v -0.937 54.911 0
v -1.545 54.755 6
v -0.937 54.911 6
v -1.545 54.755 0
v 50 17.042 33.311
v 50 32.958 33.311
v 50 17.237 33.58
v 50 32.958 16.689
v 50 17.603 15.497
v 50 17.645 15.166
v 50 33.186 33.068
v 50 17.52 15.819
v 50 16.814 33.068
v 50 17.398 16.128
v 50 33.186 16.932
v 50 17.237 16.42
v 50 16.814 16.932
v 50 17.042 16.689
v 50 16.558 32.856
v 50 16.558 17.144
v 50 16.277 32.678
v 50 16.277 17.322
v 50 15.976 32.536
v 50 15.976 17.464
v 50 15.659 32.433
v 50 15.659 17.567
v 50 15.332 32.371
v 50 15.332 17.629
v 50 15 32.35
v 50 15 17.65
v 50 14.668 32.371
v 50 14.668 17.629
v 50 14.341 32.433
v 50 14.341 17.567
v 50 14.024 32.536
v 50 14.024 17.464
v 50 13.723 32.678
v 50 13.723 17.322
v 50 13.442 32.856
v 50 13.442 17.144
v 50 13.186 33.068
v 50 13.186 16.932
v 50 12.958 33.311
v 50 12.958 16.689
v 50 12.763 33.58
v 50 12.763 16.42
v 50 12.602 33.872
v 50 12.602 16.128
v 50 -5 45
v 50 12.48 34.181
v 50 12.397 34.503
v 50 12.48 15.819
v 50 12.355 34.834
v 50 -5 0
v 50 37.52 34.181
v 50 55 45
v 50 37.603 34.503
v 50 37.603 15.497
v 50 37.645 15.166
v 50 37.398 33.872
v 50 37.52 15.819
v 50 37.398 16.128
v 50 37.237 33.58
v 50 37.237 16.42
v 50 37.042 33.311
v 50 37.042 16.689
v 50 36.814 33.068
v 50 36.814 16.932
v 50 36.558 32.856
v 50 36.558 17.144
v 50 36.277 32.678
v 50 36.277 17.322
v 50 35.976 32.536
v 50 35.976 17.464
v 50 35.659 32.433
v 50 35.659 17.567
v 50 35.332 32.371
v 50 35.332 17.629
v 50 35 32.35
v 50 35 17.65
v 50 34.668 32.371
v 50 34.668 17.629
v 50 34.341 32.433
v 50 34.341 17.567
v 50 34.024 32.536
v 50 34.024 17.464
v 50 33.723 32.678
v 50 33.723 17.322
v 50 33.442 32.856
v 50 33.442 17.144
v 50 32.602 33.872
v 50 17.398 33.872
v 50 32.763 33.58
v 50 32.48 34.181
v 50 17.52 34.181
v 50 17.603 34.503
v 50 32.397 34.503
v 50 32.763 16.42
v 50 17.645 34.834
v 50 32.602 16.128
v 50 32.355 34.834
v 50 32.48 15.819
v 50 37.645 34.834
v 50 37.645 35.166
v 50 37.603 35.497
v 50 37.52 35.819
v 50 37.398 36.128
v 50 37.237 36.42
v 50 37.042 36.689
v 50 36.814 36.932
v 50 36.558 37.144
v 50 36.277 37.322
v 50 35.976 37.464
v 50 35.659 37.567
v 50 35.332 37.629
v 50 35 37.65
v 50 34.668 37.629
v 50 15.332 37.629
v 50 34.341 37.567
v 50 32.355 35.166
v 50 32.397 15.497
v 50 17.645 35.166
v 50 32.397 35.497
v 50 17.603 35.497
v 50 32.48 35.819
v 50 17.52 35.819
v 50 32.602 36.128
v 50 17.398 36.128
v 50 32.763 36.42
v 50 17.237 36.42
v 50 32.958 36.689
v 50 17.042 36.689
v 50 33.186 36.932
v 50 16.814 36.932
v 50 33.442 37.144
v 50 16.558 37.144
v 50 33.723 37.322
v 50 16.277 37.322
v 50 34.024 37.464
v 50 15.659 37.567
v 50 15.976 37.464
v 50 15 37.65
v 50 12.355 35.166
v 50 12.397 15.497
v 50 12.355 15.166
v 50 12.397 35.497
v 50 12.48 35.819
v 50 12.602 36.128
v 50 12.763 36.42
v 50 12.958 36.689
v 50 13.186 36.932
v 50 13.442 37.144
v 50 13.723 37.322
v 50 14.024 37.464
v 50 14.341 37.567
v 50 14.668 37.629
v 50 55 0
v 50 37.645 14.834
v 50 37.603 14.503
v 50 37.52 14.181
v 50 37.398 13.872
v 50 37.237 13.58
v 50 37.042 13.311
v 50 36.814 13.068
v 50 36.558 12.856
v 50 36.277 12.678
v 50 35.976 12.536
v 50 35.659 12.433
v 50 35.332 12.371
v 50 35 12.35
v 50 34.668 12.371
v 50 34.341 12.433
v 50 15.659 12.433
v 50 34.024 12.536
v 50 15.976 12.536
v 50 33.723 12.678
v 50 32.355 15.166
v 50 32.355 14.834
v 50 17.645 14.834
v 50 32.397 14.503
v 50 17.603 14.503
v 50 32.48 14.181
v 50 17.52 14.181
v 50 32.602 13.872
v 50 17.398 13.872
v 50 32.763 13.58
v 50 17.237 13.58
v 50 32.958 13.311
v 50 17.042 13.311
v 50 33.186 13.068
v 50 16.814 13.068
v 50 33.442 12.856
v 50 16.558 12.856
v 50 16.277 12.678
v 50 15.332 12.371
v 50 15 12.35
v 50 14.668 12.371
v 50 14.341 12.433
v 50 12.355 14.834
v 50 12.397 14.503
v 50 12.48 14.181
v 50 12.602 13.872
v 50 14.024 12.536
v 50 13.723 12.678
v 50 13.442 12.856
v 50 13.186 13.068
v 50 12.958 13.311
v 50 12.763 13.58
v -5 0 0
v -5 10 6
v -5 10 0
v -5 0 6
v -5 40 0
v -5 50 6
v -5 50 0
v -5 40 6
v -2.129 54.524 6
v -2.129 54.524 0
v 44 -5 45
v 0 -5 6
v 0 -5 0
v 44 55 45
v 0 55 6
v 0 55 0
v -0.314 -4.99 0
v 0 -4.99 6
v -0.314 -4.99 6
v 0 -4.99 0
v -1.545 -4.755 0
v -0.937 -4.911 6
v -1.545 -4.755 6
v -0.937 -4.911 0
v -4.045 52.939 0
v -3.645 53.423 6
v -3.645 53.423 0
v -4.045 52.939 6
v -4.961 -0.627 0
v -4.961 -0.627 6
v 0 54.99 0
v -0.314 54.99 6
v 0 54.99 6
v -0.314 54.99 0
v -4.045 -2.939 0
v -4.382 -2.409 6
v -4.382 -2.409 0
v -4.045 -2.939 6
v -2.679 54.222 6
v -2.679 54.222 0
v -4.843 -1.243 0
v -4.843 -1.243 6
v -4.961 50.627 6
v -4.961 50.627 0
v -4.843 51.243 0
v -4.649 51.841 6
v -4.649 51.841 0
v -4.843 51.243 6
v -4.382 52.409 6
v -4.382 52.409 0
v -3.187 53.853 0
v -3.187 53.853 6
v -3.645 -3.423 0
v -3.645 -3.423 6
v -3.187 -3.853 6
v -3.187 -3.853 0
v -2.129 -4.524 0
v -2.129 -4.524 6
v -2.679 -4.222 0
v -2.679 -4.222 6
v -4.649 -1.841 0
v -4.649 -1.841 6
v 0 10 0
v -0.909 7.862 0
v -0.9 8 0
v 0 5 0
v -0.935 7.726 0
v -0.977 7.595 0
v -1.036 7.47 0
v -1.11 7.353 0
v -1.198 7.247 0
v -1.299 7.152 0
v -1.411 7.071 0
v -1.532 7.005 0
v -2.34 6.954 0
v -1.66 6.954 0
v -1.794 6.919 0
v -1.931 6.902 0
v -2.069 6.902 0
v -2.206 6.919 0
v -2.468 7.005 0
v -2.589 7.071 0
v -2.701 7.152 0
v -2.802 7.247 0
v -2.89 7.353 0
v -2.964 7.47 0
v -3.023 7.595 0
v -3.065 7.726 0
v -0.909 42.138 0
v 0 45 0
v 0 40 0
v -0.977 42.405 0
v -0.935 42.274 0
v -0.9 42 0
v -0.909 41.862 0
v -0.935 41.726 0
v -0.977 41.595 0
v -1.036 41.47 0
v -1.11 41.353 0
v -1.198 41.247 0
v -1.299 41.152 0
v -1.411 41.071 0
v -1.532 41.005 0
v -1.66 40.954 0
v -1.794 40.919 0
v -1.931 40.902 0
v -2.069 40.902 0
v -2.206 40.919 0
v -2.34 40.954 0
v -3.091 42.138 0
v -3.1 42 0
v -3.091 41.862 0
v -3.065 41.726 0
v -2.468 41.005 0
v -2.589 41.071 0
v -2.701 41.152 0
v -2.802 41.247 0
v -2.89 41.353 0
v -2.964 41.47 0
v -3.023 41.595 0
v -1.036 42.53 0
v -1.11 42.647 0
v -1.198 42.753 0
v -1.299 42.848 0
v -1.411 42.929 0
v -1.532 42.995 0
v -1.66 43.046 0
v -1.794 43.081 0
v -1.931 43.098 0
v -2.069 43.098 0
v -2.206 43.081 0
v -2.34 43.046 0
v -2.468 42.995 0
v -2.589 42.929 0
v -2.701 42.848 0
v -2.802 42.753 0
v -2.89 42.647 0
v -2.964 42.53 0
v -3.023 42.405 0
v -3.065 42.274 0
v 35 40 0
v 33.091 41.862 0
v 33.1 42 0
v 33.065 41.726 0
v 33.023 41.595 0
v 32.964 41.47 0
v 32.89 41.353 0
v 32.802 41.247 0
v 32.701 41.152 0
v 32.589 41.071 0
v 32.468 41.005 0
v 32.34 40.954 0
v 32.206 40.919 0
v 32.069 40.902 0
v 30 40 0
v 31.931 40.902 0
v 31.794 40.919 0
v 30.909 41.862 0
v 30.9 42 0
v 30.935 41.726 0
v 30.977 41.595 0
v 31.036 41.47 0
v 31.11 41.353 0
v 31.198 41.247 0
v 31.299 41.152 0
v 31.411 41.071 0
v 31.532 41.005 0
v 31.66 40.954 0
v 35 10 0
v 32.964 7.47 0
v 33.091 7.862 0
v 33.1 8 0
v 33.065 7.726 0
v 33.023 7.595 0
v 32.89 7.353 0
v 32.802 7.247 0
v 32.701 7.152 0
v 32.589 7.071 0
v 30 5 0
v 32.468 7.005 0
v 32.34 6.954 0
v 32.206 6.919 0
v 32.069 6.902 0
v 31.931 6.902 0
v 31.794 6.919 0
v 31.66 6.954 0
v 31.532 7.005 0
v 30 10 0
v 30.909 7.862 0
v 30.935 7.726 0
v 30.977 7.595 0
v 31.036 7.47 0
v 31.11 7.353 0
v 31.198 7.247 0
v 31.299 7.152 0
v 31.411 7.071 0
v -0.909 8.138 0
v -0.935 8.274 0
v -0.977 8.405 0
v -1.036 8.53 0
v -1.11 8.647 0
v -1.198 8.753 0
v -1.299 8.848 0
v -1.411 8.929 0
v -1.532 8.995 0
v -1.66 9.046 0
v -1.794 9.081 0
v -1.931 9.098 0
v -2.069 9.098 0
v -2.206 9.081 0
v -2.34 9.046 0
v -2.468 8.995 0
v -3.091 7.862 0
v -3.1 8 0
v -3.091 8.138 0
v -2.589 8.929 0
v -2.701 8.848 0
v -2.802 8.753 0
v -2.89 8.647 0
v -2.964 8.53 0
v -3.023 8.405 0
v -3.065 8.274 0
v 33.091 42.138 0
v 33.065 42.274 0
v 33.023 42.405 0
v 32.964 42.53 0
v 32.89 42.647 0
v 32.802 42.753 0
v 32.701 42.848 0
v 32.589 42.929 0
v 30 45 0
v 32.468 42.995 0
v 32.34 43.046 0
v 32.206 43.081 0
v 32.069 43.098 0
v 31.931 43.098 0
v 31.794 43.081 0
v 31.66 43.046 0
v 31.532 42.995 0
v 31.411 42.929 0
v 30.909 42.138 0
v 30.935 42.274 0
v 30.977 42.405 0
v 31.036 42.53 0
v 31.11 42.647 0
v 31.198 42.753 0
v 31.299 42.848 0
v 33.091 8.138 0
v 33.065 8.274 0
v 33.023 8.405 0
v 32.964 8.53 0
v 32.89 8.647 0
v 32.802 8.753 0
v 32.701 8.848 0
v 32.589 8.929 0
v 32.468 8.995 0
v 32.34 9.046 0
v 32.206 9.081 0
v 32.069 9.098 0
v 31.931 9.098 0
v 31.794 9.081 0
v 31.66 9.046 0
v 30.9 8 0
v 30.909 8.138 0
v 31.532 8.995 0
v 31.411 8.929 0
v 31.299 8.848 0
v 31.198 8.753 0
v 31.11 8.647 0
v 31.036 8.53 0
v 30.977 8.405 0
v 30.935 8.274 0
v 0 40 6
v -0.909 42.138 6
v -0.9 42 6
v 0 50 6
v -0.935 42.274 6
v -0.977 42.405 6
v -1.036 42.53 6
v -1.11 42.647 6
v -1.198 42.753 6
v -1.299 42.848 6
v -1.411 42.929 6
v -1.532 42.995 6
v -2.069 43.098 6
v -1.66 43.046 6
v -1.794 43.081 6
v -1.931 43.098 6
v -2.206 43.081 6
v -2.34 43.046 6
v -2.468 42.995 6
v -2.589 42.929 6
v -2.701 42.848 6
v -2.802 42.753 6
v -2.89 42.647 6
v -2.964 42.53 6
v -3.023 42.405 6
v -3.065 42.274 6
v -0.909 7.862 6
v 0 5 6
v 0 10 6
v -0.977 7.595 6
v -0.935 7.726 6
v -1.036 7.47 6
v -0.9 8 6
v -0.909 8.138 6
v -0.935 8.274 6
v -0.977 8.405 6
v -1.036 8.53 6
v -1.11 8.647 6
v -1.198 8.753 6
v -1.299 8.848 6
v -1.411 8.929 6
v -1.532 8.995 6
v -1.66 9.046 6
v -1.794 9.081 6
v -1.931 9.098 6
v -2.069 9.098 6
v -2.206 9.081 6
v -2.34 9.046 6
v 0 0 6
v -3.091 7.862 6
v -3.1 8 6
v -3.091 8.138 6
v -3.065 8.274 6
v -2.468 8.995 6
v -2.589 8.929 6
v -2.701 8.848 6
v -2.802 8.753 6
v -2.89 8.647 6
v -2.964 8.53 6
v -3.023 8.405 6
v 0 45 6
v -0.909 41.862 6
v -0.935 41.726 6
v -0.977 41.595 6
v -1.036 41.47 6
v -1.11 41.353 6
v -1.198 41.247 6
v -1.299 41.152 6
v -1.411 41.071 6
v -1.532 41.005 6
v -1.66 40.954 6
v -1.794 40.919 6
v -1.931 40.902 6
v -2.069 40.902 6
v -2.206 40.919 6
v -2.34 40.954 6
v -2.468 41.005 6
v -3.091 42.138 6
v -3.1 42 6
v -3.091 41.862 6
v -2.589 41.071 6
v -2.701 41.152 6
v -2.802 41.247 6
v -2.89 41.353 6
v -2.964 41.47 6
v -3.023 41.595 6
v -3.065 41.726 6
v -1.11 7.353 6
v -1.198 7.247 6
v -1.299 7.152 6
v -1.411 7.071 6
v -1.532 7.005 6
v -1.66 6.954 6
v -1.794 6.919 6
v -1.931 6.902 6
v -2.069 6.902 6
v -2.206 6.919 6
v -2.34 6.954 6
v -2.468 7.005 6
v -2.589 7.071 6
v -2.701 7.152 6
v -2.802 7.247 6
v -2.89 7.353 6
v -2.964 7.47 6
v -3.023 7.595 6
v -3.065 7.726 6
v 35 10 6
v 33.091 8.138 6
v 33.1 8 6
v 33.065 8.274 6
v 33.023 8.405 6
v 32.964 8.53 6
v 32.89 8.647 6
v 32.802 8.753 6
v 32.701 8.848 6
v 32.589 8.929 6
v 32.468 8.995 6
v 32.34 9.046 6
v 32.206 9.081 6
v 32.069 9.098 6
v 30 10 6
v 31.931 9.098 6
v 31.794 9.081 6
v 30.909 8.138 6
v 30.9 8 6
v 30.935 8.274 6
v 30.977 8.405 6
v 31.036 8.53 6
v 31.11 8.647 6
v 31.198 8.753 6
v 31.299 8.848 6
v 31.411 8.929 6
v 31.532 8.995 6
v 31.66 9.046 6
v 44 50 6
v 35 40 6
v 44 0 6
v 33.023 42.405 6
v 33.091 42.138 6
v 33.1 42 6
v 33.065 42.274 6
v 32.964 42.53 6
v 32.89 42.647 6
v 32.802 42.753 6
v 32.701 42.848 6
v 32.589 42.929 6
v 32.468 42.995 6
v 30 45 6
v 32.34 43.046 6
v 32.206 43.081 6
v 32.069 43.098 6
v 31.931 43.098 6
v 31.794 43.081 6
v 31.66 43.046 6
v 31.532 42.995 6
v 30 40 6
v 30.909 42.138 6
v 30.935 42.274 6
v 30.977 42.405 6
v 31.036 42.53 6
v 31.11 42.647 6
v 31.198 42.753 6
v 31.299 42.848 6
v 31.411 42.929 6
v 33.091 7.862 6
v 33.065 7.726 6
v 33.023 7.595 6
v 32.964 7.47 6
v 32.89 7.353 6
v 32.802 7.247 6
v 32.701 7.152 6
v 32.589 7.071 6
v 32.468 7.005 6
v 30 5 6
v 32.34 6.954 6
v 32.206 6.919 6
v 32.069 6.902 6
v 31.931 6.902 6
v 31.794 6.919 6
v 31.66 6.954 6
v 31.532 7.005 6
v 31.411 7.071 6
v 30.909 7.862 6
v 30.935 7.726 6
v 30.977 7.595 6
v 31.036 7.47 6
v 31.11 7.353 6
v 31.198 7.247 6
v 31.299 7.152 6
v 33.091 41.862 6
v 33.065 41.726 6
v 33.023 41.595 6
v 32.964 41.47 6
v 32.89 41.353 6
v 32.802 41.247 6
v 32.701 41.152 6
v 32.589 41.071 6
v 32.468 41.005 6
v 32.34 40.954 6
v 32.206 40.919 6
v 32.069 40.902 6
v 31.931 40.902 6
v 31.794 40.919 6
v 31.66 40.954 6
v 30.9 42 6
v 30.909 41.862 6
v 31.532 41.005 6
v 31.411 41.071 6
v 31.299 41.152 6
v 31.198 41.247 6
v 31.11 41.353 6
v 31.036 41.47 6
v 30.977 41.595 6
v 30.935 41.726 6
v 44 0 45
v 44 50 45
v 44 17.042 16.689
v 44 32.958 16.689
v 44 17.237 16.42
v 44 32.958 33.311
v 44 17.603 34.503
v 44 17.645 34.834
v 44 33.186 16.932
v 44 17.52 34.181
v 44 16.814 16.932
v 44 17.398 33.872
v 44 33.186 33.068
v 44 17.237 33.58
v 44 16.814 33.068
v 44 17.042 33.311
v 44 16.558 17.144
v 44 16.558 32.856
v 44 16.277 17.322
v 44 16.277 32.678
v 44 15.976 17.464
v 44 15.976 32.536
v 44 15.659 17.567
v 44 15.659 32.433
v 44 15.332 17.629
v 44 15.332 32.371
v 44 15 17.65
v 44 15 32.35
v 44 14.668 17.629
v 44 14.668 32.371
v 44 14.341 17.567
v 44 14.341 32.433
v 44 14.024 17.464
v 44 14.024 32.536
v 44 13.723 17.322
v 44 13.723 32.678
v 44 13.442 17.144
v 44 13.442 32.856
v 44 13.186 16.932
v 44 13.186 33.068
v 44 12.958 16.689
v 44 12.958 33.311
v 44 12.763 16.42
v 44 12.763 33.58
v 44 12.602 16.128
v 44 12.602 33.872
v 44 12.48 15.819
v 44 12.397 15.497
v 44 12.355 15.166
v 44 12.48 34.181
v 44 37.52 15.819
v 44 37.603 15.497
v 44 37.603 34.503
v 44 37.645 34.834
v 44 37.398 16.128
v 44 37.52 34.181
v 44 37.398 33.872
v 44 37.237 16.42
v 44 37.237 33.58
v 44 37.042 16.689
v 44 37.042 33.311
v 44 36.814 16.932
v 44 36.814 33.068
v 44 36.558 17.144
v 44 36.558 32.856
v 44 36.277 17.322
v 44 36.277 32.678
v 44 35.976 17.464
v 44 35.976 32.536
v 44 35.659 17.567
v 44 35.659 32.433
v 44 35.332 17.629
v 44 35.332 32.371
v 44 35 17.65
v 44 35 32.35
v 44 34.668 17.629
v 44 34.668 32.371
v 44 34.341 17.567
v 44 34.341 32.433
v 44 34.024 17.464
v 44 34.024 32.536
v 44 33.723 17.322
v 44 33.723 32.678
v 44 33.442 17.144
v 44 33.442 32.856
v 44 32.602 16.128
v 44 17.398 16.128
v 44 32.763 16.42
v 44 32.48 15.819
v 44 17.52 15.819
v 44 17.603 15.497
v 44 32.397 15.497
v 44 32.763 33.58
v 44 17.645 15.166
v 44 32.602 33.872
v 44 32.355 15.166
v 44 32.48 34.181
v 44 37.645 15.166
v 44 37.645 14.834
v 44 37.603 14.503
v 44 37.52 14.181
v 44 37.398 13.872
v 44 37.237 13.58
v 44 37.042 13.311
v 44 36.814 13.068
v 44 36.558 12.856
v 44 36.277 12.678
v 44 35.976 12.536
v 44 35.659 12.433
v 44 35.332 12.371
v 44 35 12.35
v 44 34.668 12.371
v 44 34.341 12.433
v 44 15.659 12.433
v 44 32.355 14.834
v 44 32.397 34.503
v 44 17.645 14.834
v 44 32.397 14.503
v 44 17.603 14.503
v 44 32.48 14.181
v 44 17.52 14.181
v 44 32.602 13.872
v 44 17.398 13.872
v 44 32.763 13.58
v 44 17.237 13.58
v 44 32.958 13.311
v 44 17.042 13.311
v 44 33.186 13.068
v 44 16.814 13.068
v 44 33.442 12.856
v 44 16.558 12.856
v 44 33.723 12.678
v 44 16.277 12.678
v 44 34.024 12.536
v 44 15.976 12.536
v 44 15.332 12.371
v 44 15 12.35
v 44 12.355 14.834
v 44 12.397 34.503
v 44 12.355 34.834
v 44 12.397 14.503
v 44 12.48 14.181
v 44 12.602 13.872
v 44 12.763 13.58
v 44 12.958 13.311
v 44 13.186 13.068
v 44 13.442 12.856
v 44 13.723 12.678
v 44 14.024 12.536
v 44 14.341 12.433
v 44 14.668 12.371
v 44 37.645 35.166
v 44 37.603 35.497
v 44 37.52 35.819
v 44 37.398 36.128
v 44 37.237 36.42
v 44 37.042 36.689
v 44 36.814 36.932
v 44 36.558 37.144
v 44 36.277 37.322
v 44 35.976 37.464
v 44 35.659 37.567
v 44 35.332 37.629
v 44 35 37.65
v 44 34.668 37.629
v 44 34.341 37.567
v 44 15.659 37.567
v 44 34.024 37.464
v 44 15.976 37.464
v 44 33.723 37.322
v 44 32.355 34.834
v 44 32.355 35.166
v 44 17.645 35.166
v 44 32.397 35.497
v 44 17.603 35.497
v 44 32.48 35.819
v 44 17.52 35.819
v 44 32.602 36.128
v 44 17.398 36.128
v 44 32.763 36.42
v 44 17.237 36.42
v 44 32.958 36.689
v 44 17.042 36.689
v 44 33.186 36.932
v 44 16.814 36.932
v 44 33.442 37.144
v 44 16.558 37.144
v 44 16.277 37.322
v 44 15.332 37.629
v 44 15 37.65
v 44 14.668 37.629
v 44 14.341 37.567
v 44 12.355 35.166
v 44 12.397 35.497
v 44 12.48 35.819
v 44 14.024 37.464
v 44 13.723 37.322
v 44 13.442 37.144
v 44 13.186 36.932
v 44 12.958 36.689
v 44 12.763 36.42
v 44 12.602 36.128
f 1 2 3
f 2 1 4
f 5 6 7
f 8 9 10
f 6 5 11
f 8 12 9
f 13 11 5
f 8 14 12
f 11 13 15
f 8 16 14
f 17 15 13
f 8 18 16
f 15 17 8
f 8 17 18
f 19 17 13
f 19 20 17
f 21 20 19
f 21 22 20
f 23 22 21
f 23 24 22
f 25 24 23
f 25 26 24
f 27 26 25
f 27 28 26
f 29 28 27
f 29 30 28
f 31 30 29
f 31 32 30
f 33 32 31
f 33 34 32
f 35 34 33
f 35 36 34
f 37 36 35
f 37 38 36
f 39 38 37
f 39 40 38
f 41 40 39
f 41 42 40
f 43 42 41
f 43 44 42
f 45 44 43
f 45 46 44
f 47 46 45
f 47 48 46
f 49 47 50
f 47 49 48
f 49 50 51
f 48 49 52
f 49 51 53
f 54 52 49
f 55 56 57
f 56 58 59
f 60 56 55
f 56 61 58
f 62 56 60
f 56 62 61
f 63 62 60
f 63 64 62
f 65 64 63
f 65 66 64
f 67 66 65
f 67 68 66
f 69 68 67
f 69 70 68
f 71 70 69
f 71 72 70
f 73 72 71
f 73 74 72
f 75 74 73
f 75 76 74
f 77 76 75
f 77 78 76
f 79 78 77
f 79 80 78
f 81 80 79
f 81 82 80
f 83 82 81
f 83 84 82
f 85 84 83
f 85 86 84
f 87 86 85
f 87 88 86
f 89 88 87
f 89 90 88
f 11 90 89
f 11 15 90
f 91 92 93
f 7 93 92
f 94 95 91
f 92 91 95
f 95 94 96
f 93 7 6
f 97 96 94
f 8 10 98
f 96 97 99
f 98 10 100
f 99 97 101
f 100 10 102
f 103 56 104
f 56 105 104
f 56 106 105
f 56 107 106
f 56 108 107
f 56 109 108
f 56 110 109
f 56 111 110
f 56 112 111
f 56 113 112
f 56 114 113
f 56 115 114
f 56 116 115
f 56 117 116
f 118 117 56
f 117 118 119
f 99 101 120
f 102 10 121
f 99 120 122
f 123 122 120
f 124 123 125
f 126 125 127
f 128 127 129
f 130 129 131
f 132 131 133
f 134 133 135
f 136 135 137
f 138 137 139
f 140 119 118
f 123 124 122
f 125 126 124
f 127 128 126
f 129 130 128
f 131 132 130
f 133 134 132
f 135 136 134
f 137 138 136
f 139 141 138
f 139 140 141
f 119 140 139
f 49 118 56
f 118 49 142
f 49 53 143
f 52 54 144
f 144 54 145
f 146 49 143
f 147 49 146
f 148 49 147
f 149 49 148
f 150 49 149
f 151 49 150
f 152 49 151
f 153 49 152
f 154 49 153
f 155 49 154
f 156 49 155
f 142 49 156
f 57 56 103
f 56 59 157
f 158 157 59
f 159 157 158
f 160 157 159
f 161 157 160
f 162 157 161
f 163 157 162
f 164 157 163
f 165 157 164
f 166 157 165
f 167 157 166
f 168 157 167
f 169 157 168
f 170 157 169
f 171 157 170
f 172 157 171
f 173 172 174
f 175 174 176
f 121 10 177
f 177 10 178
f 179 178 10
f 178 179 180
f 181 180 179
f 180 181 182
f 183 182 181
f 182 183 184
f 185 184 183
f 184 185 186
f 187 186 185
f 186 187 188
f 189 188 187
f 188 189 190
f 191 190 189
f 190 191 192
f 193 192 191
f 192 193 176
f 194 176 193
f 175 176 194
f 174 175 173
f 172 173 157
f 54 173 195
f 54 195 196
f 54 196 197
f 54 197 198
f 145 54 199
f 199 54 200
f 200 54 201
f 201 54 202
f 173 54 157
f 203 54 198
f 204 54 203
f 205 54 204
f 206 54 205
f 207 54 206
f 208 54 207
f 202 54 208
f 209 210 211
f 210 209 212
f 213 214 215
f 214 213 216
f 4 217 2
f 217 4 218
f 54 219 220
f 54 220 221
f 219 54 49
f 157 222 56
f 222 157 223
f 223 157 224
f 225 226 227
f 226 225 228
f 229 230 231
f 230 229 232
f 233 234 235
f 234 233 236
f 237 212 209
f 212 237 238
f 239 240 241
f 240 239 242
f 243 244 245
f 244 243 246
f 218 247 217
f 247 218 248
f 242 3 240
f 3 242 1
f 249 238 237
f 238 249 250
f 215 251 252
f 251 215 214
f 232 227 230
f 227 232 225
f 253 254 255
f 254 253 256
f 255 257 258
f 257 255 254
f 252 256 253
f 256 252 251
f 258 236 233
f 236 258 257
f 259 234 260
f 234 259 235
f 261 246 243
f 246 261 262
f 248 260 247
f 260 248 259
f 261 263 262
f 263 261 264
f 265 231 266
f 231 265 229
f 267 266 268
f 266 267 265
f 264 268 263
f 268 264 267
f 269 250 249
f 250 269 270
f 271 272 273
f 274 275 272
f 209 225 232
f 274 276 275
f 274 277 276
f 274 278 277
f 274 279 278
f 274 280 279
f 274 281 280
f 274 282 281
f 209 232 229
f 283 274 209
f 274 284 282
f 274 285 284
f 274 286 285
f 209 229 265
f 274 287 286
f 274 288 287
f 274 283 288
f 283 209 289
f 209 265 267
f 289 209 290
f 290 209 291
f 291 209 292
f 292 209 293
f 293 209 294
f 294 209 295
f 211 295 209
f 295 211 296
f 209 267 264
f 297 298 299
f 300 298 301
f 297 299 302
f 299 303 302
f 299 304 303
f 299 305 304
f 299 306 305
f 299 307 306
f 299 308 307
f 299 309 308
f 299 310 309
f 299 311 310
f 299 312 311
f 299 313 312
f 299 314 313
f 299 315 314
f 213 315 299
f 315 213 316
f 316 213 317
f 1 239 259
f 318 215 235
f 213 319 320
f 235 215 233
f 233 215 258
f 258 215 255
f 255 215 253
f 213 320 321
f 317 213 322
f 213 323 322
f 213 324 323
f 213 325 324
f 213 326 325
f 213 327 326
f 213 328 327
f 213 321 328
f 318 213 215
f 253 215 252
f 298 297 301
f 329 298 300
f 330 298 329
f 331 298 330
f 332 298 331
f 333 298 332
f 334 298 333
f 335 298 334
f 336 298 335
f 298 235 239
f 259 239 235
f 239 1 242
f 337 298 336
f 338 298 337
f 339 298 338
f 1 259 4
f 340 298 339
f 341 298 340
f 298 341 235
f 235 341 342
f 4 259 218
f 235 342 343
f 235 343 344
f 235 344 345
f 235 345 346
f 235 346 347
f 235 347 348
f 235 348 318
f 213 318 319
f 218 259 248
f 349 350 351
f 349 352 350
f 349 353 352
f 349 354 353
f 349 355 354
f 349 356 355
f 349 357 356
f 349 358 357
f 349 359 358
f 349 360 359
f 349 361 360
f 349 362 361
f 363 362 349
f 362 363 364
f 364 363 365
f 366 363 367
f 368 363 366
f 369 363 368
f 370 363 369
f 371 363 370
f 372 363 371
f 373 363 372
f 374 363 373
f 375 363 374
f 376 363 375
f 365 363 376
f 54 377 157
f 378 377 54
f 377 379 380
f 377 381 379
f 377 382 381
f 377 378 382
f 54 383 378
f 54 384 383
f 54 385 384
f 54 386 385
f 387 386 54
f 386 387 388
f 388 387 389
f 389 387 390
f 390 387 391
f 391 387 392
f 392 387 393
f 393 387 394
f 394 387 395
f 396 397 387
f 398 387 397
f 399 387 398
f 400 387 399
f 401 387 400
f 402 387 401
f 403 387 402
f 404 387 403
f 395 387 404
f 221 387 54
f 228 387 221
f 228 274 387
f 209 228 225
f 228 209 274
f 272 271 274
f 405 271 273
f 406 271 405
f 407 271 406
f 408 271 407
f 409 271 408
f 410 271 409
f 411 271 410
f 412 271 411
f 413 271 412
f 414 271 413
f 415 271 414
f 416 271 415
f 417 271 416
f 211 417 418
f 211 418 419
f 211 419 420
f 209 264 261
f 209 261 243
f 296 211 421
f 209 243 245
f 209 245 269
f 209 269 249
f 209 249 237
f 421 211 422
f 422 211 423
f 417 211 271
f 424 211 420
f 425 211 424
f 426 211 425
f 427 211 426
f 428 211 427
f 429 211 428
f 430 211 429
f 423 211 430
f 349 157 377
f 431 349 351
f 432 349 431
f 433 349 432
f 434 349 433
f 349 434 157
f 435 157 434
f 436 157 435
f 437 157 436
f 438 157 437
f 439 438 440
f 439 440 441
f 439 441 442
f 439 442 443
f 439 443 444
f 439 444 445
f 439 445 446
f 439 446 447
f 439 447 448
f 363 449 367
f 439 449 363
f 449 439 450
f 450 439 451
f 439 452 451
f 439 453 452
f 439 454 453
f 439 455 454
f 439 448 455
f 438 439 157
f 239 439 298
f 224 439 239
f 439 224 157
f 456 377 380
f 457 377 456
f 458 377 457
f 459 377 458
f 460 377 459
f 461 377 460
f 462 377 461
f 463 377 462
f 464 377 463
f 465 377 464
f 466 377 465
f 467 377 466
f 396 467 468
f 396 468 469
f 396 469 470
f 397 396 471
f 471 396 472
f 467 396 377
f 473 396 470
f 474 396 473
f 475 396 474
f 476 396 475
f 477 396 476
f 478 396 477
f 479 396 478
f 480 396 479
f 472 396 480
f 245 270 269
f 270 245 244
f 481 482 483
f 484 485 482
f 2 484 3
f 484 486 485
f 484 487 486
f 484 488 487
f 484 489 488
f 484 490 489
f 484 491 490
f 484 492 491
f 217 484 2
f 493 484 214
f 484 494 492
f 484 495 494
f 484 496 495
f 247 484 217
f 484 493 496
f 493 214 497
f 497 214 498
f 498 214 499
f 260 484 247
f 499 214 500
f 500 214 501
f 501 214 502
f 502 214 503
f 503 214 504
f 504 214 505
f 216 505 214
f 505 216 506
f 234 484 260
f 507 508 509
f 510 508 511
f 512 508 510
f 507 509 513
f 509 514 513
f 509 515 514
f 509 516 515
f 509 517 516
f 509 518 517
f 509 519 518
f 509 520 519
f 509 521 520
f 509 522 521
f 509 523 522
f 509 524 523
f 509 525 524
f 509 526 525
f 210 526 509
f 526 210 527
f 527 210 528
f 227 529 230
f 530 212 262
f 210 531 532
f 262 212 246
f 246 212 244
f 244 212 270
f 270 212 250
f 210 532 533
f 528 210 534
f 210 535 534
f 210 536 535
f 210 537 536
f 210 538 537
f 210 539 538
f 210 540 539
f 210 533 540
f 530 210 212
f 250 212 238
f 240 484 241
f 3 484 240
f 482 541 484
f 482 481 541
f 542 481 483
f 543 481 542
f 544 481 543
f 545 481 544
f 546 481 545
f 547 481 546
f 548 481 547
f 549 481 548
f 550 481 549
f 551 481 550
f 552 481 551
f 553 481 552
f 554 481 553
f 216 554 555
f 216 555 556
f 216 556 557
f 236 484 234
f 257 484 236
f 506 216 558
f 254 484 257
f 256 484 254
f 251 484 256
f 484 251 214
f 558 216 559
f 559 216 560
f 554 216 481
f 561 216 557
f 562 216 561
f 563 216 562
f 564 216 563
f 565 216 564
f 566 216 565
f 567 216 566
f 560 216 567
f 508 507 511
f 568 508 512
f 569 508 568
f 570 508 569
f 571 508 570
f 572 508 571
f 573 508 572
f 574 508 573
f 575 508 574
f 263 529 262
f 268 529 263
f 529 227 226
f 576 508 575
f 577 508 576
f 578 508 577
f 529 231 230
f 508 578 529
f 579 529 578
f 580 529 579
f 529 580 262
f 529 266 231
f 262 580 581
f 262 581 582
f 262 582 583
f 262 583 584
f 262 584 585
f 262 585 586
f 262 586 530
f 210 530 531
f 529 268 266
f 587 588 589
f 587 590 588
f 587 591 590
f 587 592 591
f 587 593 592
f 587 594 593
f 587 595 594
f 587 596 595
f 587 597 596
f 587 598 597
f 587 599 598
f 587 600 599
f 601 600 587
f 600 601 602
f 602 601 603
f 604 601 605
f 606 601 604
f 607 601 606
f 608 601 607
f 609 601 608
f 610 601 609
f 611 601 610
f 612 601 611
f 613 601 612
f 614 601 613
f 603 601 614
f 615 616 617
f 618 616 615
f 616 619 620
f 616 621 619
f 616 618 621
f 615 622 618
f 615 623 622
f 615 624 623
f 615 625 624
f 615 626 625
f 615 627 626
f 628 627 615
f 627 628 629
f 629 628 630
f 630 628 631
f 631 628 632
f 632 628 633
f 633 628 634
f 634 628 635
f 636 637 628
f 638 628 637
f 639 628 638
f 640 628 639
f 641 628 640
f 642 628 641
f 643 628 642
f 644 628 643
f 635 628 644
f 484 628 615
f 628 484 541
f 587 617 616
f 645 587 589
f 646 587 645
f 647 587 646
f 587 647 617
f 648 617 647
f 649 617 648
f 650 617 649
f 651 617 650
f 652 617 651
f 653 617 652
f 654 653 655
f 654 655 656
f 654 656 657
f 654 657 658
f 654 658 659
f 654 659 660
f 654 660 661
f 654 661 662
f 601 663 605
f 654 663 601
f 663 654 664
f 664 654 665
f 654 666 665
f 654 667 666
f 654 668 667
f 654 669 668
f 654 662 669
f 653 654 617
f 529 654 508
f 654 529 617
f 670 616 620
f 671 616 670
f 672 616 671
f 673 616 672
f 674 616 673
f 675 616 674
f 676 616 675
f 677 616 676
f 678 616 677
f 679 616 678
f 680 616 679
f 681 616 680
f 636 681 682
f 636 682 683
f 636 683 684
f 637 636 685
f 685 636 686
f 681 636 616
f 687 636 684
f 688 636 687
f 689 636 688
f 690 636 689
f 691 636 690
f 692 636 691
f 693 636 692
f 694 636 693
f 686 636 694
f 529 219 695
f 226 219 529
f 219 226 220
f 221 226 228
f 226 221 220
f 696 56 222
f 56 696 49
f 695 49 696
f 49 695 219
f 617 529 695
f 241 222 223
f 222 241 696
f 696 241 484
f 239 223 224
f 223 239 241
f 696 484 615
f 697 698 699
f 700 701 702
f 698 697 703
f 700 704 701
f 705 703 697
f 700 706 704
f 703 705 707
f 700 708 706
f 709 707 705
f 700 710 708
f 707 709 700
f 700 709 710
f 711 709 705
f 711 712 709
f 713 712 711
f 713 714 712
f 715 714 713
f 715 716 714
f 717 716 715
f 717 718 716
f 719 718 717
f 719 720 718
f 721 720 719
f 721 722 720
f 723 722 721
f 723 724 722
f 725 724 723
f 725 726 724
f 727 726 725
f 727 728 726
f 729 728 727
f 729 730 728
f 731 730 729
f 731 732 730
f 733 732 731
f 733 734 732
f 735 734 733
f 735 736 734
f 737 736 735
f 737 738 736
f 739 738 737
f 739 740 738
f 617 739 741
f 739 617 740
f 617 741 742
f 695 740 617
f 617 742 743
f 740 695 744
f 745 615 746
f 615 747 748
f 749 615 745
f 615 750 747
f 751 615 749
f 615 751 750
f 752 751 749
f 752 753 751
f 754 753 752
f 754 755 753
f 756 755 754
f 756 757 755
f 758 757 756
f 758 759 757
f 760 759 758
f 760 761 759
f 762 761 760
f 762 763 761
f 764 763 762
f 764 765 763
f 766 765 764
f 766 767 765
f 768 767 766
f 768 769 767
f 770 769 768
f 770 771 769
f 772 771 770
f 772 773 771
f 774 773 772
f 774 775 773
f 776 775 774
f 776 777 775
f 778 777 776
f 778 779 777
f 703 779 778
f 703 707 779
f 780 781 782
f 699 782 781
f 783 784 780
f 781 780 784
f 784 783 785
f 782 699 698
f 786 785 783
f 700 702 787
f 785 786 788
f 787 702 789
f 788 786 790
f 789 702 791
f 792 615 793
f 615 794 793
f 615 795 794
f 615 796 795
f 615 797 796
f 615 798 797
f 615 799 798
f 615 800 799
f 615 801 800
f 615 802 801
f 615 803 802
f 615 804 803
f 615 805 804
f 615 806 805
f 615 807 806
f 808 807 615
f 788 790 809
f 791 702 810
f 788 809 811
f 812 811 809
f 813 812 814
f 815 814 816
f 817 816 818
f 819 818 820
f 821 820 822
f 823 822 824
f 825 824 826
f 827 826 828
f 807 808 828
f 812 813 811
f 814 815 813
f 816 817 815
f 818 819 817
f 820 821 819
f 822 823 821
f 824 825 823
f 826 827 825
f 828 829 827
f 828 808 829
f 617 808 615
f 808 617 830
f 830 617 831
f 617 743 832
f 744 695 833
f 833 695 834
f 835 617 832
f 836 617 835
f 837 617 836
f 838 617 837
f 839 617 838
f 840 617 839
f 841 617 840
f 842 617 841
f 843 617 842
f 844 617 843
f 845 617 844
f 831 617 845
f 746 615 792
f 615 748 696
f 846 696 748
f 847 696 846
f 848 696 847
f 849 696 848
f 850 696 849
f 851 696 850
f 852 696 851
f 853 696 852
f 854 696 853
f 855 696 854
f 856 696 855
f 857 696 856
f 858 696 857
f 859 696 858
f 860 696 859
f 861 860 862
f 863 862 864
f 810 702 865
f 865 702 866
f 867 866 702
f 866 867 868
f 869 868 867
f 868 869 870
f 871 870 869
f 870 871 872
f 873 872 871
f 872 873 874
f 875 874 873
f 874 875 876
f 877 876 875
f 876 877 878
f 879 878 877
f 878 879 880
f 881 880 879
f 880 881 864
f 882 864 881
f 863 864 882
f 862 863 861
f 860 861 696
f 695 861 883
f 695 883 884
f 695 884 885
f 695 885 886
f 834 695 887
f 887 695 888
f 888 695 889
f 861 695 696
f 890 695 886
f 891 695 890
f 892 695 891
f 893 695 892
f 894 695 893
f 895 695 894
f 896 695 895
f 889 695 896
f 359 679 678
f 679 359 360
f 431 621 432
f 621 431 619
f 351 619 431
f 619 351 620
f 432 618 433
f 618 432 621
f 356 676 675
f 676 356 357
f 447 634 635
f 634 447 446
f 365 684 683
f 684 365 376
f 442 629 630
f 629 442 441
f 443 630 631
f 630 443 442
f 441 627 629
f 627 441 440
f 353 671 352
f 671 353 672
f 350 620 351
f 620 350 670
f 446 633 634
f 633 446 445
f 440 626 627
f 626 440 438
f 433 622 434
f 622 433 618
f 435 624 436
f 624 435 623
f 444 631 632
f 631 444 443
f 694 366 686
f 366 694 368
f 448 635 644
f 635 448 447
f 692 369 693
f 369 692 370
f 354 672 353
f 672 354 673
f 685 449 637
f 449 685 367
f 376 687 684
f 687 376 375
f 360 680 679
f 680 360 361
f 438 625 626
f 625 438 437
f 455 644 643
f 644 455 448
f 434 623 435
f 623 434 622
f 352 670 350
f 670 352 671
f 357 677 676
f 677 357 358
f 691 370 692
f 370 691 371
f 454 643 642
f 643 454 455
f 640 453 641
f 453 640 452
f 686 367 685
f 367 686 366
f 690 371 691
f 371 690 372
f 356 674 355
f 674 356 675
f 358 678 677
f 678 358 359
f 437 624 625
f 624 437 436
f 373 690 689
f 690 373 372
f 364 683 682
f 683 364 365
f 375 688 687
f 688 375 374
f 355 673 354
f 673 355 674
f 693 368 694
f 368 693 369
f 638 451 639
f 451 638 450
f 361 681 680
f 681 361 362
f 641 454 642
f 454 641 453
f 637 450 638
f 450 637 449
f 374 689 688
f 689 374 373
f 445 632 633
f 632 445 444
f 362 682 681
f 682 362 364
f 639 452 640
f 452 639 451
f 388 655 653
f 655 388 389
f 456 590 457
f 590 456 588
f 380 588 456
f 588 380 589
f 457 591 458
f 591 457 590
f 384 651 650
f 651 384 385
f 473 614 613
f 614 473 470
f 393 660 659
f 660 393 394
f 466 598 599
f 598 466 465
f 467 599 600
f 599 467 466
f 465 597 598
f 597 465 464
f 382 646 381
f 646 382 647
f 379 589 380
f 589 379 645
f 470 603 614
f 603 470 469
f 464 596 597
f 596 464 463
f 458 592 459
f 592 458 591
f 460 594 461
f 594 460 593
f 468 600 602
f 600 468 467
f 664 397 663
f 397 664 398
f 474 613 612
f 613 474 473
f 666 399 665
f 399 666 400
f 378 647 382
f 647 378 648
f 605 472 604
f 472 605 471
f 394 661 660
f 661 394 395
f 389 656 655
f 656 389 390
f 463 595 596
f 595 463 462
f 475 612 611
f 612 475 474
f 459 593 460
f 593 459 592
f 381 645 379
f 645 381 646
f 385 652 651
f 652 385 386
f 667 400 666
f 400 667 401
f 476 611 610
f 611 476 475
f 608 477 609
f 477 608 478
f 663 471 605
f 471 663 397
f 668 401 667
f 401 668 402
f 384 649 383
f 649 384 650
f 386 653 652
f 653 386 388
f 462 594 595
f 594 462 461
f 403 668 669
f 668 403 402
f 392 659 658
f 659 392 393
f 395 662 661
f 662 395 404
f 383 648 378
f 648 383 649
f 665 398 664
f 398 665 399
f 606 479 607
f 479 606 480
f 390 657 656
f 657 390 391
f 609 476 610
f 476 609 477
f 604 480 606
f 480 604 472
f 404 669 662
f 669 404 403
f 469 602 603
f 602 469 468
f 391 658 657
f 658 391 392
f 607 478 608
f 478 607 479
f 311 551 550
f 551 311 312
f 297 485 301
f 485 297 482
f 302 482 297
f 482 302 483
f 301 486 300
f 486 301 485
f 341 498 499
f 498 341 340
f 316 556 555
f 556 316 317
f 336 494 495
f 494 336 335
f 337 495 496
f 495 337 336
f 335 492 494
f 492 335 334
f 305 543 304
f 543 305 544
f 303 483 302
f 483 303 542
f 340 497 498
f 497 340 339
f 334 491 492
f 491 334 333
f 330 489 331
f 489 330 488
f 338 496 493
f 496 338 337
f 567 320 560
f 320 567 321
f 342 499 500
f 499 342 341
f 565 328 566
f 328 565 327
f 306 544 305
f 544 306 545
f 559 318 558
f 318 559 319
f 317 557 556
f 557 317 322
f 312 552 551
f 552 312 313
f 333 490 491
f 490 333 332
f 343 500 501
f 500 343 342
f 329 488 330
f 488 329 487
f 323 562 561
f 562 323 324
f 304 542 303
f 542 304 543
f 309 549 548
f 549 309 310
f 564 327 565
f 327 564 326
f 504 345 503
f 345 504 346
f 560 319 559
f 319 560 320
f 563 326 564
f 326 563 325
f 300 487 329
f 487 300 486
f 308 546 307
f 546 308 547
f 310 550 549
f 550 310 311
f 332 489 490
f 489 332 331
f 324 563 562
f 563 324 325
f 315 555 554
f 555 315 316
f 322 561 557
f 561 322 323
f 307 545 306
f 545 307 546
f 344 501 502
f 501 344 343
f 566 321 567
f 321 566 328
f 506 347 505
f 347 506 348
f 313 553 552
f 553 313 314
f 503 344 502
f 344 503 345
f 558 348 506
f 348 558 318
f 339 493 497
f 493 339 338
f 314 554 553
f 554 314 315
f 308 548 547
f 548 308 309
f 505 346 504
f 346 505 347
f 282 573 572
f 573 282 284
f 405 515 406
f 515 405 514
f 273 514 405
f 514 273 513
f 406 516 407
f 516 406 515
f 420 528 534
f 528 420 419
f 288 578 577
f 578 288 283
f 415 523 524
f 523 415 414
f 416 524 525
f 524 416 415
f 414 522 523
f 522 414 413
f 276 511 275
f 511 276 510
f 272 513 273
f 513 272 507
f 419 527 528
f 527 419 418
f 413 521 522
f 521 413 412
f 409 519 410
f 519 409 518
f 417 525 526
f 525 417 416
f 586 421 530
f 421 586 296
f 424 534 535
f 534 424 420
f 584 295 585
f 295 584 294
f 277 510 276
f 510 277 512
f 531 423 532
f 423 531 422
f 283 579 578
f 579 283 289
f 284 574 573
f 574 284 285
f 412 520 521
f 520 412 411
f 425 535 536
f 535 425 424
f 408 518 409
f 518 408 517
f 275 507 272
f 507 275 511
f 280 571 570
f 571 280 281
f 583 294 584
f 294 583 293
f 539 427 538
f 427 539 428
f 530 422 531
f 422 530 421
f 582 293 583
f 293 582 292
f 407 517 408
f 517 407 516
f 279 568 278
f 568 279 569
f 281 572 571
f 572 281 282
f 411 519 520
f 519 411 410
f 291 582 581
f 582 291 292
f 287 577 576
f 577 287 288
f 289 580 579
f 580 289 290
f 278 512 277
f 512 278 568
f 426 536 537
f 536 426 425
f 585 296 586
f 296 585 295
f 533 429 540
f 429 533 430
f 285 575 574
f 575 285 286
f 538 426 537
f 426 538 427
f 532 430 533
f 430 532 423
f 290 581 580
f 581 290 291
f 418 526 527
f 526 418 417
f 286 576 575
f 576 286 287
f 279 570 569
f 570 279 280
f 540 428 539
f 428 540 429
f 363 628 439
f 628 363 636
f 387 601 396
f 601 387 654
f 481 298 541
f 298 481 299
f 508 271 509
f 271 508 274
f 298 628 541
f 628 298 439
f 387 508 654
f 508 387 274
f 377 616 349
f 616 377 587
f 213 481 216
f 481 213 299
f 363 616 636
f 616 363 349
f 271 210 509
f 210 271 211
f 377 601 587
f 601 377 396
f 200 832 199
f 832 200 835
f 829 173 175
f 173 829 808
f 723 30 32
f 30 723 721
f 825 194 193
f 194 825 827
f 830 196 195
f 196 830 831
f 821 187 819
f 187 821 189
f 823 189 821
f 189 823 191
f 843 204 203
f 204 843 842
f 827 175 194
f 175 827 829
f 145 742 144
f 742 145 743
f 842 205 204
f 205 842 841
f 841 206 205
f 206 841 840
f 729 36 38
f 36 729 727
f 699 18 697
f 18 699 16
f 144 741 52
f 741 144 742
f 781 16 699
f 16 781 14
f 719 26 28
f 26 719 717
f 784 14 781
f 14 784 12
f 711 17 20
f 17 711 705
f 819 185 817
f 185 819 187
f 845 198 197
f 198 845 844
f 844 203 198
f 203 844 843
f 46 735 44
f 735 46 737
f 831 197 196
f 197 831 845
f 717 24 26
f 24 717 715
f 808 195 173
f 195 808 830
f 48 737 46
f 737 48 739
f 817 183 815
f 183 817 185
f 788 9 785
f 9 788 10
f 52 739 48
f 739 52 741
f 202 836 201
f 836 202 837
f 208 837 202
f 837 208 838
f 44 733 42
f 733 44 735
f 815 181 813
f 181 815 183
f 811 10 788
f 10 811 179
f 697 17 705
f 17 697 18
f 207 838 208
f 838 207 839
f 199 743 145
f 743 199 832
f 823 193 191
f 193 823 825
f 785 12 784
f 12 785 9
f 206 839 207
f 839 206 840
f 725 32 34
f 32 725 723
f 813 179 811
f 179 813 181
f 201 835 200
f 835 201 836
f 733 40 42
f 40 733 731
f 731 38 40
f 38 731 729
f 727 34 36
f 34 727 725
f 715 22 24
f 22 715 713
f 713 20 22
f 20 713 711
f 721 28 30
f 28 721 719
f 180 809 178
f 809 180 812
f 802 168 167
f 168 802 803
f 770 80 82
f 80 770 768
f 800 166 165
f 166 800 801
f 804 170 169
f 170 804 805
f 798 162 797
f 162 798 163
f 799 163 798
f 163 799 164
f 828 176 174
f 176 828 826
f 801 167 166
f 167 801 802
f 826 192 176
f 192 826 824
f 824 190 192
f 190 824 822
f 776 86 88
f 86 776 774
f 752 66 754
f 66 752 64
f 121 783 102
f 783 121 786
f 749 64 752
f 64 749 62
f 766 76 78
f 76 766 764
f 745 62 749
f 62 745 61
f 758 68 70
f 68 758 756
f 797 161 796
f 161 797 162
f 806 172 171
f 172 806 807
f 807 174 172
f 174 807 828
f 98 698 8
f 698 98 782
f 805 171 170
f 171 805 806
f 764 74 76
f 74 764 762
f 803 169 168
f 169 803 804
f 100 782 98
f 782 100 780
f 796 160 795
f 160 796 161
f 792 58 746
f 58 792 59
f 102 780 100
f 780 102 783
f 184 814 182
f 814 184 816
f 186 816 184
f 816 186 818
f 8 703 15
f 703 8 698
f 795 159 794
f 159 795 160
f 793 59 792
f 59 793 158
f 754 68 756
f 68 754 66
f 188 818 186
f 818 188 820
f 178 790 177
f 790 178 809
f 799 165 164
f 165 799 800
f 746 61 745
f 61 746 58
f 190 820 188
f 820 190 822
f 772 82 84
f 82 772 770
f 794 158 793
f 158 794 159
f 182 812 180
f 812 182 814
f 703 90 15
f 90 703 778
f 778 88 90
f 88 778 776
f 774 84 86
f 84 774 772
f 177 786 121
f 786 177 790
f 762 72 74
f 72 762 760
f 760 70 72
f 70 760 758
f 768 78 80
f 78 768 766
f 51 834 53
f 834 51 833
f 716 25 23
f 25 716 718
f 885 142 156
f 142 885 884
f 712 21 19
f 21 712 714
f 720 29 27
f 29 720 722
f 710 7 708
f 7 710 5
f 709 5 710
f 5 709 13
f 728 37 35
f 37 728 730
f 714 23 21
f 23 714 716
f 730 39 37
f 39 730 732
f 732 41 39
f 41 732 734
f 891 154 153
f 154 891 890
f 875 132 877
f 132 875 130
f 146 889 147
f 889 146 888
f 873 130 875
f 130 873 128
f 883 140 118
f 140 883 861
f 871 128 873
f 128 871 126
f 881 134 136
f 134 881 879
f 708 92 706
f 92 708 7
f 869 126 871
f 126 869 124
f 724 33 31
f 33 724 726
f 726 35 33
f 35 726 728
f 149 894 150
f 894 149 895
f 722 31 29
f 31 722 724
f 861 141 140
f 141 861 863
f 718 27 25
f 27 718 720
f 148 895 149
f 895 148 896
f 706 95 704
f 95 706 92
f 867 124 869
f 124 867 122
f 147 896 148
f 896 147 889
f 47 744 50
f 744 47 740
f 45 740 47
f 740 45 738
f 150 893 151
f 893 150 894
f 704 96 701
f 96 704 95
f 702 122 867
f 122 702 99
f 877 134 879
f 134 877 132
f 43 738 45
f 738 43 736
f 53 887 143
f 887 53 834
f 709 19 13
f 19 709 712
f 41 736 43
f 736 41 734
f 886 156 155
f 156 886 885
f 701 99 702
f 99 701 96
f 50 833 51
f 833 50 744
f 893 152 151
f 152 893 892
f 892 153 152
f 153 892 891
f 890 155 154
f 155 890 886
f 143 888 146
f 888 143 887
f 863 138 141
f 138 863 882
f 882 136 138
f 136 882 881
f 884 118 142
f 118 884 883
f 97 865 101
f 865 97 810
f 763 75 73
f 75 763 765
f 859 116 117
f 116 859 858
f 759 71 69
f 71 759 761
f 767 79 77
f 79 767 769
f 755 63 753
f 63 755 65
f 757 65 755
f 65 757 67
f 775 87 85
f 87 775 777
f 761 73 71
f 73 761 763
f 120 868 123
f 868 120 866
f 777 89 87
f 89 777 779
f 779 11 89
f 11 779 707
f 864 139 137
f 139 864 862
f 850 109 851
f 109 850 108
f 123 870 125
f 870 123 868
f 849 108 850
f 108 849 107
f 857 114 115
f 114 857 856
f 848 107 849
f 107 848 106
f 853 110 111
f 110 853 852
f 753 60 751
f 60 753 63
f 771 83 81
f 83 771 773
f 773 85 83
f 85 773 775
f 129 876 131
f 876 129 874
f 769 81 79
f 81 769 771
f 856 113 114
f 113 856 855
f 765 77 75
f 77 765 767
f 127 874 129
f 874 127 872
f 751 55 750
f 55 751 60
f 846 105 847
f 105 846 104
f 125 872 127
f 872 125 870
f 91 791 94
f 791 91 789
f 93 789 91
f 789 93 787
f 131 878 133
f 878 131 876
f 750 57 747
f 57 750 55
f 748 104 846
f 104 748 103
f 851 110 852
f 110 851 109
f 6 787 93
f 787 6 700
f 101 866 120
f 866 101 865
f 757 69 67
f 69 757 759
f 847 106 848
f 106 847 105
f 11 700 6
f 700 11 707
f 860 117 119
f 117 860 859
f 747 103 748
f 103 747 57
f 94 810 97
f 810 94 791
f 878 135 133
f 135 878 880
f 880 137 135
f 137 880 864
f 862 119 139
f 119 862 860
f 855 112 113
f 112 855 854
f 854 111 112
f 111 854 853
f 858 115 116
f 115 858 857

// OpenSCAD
$fn=50;
$cameraholes=34;
$thickness=6;
$width=50;
$depth=45;
$drill5=5.3;
$drill2=2.2;

difference() {
    union() {
        hull() {
            translate([0,0,0]) cylinder(r=5,h=$thickness);
            translate([0,$width,0]) cylinder(r=5,h=$thickness);
            translate([$depth,-5,0]) cube([5,5,$thickness]);
            translate([$depth,$width,0]) cube([5,5,$thickness]);
        }
        hull() {
            translate([0,-5,0]) cube([5,5,$thickness]);
            translate([$depth,-5,0]) cube([5,5,$thickness]);
            translate([$depth-1,-5,39]) cube([5,5,$thickness]);
        }
        hull() {
            translate([0,$width,0]) cube([5,5,$thickness]);
            translate([$depth,$width,0]) cube([5,5,$thickness]);
            translate([$depth-1,$width,39]) cube([5,5,$thickness]);
        }
        translate([$depth-1,-5,$thickness]) cube([$thickness, $width+10, 45-$thickness]);
    }
    translate([15+$cameraholes/2, $width/2+$cameraholes/2, -1])cylinder(r=$drill2/2,h=$thickness+2);
    translate([15+$cameraholes/2, $width/2-$cameraholes/2, -1])cylinder(r=$drill2/2,h=$thickness+2);
    translate([15-$cameraholes/2, $width/2+$cameraholes/2, -1])cylinder(r=$drill2/2,h=$thickness+2);
    translate([15-$cameraholes/2, $width/2-$cameraholes/2, -1])cylinder(r=$drill2/2,h=$thickness+2);
    
    translate([15-15,$width/2-20,-1]) cube([30,40,$thickness+2]);
    translate([15-20,$width/2-15,-1]) cube([40,30,$thickness+2]);

    translate([$depth-2,$width/2-10,15]) rotate([0,90,0]) cylinder(r=$drill5/2,h=$thickness+2);
    translate([$depth-2,$width/2+10,15]) rotate([0,90,0]) cylinder(r=$drill5/2,h=$thickness+2);
    translate([$depth-2,$width/2-10,35]) rotate([0,90,0]) cylinder(r=$drill5/2,h=$thickness+2);
    translate([$depth-2,$width/2+10,35]) rotate([0,90,0]) cylinder(r=$drill5/2,h=$thickness+2);

//    translate([$depth-5,$width/2+10,-1]) cylinder(r=$drill5/2,h=$thickness+2);
//    translate([$depth-25,$width/2-10,-1]) cylinder(r=$drill5/2,h=$thickness+2);
//    translate([$depth-25,$width/2+10,-1]) cylinder(r=$drill5/2,h=$thickness+2);
}
